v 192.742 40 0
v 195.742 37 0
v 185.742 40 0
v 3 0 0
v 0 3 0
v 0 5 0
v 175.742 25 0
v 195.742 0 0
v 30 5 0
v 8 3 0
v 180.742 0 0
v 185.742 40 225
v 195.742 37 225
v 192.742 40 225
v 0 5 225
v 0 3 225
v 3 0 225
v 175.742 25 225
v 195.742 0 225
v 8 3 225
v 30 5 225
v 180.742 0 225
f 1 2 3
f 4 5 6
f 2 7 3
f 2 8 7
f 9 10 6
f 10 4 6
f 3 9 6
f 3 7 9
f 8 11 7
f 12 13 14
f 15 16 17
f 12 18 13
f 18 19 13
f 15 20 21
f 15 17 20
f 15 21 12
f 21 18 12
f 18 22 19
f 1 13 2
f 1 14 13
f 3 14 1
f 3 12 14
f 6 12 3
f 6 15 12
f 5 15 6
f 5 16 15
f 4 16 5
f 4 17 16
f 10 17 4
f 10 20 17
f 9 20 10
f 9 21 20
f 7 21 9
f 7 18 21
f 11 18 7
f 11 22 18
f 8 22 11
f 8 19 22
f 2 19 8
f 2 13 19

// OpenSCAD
/* 扫地机器人斜坡模型 - 改进版 */
// 用于让机器人爬上一个高台
// 特点：渐变厚度设计，节约材料；添加倒角，方便机器人上下

// ========== 参数（单位：mm） ==========
SLOPE_LENGTH = 190;    // 坡长（斜面长度）19cm
HEIGHT       = 40;     // 坡高 4cm
THICKNESS_MAX = 15;    // 最大厚度（后端）1.5cm
THICKNESS_MIN = 5;     // 最小厚度（前端）5mm，保证强度
WIDTH        = 225;    // 坡宽 22.5cm
PLATFORM     = 10;     // 坡顶平台长度 1cm
CHAMFER      = 3;      // 倒角大小 3mm

// ========== 派生值 ==========
RUN = sqrt(pow(SLOPE_LENGTH, 2) - pow(HEIGHT, 2));  // 水平投影 ≈196mm

// ========== 2D 截面（带倒角和渐变厚度）==========
module cross_section() {
    polygon([
        // 外轮廓（从前到后，逆时针）
        [CHAMFER, 0],                          // V1: 前端底部（倒角后）
        [0, CHAMFER],                          // V2: 前端底部倒角点
        [0, THICKNESS_MIN],                    // V3: 前端外侧面
        [RUN, HEIGHT],                         // V4: 斜坡顶端
        [RUN + PLATFORM - CHAMFER, HEIGHT],    // V5: 平台顶部（倒角前）
        [RUN + PLATFORM, HEIGHT - CHAMFER],    // V6: 平台顶部倒角点
        [RUN + PLATFORM, 0],                   // V7: 后端底部
        
        // 内轮廓（从后到前，继续逆时针闭合）
        [RUN + PLATFORM - THICKNESS_MAX, 0],   // V8: 后端内侧底部
        [RUN - 10, HEIGHT - THICKNESS_MAX],    // V9: 平台内侧（与斜坡交界）
        [30, THICKNESS_MIN],                   // V10: 前端内侧顶部
        [CHAMFER + 5, CHAMFER],                // V11: 前端内侧倒角过渡
    ]);
}

// ========== 3D 模型（沿宽度方向拉伸）==========
linear_extrude(height = WIDTH) {
    cross_section();
}

// ========== 可选：添加侧面倒角 ==========
// 如果需要侧面也有倒角，可以使用 minkowski 或者更复杂的造型
// 这里先实现基本的截面倒角
